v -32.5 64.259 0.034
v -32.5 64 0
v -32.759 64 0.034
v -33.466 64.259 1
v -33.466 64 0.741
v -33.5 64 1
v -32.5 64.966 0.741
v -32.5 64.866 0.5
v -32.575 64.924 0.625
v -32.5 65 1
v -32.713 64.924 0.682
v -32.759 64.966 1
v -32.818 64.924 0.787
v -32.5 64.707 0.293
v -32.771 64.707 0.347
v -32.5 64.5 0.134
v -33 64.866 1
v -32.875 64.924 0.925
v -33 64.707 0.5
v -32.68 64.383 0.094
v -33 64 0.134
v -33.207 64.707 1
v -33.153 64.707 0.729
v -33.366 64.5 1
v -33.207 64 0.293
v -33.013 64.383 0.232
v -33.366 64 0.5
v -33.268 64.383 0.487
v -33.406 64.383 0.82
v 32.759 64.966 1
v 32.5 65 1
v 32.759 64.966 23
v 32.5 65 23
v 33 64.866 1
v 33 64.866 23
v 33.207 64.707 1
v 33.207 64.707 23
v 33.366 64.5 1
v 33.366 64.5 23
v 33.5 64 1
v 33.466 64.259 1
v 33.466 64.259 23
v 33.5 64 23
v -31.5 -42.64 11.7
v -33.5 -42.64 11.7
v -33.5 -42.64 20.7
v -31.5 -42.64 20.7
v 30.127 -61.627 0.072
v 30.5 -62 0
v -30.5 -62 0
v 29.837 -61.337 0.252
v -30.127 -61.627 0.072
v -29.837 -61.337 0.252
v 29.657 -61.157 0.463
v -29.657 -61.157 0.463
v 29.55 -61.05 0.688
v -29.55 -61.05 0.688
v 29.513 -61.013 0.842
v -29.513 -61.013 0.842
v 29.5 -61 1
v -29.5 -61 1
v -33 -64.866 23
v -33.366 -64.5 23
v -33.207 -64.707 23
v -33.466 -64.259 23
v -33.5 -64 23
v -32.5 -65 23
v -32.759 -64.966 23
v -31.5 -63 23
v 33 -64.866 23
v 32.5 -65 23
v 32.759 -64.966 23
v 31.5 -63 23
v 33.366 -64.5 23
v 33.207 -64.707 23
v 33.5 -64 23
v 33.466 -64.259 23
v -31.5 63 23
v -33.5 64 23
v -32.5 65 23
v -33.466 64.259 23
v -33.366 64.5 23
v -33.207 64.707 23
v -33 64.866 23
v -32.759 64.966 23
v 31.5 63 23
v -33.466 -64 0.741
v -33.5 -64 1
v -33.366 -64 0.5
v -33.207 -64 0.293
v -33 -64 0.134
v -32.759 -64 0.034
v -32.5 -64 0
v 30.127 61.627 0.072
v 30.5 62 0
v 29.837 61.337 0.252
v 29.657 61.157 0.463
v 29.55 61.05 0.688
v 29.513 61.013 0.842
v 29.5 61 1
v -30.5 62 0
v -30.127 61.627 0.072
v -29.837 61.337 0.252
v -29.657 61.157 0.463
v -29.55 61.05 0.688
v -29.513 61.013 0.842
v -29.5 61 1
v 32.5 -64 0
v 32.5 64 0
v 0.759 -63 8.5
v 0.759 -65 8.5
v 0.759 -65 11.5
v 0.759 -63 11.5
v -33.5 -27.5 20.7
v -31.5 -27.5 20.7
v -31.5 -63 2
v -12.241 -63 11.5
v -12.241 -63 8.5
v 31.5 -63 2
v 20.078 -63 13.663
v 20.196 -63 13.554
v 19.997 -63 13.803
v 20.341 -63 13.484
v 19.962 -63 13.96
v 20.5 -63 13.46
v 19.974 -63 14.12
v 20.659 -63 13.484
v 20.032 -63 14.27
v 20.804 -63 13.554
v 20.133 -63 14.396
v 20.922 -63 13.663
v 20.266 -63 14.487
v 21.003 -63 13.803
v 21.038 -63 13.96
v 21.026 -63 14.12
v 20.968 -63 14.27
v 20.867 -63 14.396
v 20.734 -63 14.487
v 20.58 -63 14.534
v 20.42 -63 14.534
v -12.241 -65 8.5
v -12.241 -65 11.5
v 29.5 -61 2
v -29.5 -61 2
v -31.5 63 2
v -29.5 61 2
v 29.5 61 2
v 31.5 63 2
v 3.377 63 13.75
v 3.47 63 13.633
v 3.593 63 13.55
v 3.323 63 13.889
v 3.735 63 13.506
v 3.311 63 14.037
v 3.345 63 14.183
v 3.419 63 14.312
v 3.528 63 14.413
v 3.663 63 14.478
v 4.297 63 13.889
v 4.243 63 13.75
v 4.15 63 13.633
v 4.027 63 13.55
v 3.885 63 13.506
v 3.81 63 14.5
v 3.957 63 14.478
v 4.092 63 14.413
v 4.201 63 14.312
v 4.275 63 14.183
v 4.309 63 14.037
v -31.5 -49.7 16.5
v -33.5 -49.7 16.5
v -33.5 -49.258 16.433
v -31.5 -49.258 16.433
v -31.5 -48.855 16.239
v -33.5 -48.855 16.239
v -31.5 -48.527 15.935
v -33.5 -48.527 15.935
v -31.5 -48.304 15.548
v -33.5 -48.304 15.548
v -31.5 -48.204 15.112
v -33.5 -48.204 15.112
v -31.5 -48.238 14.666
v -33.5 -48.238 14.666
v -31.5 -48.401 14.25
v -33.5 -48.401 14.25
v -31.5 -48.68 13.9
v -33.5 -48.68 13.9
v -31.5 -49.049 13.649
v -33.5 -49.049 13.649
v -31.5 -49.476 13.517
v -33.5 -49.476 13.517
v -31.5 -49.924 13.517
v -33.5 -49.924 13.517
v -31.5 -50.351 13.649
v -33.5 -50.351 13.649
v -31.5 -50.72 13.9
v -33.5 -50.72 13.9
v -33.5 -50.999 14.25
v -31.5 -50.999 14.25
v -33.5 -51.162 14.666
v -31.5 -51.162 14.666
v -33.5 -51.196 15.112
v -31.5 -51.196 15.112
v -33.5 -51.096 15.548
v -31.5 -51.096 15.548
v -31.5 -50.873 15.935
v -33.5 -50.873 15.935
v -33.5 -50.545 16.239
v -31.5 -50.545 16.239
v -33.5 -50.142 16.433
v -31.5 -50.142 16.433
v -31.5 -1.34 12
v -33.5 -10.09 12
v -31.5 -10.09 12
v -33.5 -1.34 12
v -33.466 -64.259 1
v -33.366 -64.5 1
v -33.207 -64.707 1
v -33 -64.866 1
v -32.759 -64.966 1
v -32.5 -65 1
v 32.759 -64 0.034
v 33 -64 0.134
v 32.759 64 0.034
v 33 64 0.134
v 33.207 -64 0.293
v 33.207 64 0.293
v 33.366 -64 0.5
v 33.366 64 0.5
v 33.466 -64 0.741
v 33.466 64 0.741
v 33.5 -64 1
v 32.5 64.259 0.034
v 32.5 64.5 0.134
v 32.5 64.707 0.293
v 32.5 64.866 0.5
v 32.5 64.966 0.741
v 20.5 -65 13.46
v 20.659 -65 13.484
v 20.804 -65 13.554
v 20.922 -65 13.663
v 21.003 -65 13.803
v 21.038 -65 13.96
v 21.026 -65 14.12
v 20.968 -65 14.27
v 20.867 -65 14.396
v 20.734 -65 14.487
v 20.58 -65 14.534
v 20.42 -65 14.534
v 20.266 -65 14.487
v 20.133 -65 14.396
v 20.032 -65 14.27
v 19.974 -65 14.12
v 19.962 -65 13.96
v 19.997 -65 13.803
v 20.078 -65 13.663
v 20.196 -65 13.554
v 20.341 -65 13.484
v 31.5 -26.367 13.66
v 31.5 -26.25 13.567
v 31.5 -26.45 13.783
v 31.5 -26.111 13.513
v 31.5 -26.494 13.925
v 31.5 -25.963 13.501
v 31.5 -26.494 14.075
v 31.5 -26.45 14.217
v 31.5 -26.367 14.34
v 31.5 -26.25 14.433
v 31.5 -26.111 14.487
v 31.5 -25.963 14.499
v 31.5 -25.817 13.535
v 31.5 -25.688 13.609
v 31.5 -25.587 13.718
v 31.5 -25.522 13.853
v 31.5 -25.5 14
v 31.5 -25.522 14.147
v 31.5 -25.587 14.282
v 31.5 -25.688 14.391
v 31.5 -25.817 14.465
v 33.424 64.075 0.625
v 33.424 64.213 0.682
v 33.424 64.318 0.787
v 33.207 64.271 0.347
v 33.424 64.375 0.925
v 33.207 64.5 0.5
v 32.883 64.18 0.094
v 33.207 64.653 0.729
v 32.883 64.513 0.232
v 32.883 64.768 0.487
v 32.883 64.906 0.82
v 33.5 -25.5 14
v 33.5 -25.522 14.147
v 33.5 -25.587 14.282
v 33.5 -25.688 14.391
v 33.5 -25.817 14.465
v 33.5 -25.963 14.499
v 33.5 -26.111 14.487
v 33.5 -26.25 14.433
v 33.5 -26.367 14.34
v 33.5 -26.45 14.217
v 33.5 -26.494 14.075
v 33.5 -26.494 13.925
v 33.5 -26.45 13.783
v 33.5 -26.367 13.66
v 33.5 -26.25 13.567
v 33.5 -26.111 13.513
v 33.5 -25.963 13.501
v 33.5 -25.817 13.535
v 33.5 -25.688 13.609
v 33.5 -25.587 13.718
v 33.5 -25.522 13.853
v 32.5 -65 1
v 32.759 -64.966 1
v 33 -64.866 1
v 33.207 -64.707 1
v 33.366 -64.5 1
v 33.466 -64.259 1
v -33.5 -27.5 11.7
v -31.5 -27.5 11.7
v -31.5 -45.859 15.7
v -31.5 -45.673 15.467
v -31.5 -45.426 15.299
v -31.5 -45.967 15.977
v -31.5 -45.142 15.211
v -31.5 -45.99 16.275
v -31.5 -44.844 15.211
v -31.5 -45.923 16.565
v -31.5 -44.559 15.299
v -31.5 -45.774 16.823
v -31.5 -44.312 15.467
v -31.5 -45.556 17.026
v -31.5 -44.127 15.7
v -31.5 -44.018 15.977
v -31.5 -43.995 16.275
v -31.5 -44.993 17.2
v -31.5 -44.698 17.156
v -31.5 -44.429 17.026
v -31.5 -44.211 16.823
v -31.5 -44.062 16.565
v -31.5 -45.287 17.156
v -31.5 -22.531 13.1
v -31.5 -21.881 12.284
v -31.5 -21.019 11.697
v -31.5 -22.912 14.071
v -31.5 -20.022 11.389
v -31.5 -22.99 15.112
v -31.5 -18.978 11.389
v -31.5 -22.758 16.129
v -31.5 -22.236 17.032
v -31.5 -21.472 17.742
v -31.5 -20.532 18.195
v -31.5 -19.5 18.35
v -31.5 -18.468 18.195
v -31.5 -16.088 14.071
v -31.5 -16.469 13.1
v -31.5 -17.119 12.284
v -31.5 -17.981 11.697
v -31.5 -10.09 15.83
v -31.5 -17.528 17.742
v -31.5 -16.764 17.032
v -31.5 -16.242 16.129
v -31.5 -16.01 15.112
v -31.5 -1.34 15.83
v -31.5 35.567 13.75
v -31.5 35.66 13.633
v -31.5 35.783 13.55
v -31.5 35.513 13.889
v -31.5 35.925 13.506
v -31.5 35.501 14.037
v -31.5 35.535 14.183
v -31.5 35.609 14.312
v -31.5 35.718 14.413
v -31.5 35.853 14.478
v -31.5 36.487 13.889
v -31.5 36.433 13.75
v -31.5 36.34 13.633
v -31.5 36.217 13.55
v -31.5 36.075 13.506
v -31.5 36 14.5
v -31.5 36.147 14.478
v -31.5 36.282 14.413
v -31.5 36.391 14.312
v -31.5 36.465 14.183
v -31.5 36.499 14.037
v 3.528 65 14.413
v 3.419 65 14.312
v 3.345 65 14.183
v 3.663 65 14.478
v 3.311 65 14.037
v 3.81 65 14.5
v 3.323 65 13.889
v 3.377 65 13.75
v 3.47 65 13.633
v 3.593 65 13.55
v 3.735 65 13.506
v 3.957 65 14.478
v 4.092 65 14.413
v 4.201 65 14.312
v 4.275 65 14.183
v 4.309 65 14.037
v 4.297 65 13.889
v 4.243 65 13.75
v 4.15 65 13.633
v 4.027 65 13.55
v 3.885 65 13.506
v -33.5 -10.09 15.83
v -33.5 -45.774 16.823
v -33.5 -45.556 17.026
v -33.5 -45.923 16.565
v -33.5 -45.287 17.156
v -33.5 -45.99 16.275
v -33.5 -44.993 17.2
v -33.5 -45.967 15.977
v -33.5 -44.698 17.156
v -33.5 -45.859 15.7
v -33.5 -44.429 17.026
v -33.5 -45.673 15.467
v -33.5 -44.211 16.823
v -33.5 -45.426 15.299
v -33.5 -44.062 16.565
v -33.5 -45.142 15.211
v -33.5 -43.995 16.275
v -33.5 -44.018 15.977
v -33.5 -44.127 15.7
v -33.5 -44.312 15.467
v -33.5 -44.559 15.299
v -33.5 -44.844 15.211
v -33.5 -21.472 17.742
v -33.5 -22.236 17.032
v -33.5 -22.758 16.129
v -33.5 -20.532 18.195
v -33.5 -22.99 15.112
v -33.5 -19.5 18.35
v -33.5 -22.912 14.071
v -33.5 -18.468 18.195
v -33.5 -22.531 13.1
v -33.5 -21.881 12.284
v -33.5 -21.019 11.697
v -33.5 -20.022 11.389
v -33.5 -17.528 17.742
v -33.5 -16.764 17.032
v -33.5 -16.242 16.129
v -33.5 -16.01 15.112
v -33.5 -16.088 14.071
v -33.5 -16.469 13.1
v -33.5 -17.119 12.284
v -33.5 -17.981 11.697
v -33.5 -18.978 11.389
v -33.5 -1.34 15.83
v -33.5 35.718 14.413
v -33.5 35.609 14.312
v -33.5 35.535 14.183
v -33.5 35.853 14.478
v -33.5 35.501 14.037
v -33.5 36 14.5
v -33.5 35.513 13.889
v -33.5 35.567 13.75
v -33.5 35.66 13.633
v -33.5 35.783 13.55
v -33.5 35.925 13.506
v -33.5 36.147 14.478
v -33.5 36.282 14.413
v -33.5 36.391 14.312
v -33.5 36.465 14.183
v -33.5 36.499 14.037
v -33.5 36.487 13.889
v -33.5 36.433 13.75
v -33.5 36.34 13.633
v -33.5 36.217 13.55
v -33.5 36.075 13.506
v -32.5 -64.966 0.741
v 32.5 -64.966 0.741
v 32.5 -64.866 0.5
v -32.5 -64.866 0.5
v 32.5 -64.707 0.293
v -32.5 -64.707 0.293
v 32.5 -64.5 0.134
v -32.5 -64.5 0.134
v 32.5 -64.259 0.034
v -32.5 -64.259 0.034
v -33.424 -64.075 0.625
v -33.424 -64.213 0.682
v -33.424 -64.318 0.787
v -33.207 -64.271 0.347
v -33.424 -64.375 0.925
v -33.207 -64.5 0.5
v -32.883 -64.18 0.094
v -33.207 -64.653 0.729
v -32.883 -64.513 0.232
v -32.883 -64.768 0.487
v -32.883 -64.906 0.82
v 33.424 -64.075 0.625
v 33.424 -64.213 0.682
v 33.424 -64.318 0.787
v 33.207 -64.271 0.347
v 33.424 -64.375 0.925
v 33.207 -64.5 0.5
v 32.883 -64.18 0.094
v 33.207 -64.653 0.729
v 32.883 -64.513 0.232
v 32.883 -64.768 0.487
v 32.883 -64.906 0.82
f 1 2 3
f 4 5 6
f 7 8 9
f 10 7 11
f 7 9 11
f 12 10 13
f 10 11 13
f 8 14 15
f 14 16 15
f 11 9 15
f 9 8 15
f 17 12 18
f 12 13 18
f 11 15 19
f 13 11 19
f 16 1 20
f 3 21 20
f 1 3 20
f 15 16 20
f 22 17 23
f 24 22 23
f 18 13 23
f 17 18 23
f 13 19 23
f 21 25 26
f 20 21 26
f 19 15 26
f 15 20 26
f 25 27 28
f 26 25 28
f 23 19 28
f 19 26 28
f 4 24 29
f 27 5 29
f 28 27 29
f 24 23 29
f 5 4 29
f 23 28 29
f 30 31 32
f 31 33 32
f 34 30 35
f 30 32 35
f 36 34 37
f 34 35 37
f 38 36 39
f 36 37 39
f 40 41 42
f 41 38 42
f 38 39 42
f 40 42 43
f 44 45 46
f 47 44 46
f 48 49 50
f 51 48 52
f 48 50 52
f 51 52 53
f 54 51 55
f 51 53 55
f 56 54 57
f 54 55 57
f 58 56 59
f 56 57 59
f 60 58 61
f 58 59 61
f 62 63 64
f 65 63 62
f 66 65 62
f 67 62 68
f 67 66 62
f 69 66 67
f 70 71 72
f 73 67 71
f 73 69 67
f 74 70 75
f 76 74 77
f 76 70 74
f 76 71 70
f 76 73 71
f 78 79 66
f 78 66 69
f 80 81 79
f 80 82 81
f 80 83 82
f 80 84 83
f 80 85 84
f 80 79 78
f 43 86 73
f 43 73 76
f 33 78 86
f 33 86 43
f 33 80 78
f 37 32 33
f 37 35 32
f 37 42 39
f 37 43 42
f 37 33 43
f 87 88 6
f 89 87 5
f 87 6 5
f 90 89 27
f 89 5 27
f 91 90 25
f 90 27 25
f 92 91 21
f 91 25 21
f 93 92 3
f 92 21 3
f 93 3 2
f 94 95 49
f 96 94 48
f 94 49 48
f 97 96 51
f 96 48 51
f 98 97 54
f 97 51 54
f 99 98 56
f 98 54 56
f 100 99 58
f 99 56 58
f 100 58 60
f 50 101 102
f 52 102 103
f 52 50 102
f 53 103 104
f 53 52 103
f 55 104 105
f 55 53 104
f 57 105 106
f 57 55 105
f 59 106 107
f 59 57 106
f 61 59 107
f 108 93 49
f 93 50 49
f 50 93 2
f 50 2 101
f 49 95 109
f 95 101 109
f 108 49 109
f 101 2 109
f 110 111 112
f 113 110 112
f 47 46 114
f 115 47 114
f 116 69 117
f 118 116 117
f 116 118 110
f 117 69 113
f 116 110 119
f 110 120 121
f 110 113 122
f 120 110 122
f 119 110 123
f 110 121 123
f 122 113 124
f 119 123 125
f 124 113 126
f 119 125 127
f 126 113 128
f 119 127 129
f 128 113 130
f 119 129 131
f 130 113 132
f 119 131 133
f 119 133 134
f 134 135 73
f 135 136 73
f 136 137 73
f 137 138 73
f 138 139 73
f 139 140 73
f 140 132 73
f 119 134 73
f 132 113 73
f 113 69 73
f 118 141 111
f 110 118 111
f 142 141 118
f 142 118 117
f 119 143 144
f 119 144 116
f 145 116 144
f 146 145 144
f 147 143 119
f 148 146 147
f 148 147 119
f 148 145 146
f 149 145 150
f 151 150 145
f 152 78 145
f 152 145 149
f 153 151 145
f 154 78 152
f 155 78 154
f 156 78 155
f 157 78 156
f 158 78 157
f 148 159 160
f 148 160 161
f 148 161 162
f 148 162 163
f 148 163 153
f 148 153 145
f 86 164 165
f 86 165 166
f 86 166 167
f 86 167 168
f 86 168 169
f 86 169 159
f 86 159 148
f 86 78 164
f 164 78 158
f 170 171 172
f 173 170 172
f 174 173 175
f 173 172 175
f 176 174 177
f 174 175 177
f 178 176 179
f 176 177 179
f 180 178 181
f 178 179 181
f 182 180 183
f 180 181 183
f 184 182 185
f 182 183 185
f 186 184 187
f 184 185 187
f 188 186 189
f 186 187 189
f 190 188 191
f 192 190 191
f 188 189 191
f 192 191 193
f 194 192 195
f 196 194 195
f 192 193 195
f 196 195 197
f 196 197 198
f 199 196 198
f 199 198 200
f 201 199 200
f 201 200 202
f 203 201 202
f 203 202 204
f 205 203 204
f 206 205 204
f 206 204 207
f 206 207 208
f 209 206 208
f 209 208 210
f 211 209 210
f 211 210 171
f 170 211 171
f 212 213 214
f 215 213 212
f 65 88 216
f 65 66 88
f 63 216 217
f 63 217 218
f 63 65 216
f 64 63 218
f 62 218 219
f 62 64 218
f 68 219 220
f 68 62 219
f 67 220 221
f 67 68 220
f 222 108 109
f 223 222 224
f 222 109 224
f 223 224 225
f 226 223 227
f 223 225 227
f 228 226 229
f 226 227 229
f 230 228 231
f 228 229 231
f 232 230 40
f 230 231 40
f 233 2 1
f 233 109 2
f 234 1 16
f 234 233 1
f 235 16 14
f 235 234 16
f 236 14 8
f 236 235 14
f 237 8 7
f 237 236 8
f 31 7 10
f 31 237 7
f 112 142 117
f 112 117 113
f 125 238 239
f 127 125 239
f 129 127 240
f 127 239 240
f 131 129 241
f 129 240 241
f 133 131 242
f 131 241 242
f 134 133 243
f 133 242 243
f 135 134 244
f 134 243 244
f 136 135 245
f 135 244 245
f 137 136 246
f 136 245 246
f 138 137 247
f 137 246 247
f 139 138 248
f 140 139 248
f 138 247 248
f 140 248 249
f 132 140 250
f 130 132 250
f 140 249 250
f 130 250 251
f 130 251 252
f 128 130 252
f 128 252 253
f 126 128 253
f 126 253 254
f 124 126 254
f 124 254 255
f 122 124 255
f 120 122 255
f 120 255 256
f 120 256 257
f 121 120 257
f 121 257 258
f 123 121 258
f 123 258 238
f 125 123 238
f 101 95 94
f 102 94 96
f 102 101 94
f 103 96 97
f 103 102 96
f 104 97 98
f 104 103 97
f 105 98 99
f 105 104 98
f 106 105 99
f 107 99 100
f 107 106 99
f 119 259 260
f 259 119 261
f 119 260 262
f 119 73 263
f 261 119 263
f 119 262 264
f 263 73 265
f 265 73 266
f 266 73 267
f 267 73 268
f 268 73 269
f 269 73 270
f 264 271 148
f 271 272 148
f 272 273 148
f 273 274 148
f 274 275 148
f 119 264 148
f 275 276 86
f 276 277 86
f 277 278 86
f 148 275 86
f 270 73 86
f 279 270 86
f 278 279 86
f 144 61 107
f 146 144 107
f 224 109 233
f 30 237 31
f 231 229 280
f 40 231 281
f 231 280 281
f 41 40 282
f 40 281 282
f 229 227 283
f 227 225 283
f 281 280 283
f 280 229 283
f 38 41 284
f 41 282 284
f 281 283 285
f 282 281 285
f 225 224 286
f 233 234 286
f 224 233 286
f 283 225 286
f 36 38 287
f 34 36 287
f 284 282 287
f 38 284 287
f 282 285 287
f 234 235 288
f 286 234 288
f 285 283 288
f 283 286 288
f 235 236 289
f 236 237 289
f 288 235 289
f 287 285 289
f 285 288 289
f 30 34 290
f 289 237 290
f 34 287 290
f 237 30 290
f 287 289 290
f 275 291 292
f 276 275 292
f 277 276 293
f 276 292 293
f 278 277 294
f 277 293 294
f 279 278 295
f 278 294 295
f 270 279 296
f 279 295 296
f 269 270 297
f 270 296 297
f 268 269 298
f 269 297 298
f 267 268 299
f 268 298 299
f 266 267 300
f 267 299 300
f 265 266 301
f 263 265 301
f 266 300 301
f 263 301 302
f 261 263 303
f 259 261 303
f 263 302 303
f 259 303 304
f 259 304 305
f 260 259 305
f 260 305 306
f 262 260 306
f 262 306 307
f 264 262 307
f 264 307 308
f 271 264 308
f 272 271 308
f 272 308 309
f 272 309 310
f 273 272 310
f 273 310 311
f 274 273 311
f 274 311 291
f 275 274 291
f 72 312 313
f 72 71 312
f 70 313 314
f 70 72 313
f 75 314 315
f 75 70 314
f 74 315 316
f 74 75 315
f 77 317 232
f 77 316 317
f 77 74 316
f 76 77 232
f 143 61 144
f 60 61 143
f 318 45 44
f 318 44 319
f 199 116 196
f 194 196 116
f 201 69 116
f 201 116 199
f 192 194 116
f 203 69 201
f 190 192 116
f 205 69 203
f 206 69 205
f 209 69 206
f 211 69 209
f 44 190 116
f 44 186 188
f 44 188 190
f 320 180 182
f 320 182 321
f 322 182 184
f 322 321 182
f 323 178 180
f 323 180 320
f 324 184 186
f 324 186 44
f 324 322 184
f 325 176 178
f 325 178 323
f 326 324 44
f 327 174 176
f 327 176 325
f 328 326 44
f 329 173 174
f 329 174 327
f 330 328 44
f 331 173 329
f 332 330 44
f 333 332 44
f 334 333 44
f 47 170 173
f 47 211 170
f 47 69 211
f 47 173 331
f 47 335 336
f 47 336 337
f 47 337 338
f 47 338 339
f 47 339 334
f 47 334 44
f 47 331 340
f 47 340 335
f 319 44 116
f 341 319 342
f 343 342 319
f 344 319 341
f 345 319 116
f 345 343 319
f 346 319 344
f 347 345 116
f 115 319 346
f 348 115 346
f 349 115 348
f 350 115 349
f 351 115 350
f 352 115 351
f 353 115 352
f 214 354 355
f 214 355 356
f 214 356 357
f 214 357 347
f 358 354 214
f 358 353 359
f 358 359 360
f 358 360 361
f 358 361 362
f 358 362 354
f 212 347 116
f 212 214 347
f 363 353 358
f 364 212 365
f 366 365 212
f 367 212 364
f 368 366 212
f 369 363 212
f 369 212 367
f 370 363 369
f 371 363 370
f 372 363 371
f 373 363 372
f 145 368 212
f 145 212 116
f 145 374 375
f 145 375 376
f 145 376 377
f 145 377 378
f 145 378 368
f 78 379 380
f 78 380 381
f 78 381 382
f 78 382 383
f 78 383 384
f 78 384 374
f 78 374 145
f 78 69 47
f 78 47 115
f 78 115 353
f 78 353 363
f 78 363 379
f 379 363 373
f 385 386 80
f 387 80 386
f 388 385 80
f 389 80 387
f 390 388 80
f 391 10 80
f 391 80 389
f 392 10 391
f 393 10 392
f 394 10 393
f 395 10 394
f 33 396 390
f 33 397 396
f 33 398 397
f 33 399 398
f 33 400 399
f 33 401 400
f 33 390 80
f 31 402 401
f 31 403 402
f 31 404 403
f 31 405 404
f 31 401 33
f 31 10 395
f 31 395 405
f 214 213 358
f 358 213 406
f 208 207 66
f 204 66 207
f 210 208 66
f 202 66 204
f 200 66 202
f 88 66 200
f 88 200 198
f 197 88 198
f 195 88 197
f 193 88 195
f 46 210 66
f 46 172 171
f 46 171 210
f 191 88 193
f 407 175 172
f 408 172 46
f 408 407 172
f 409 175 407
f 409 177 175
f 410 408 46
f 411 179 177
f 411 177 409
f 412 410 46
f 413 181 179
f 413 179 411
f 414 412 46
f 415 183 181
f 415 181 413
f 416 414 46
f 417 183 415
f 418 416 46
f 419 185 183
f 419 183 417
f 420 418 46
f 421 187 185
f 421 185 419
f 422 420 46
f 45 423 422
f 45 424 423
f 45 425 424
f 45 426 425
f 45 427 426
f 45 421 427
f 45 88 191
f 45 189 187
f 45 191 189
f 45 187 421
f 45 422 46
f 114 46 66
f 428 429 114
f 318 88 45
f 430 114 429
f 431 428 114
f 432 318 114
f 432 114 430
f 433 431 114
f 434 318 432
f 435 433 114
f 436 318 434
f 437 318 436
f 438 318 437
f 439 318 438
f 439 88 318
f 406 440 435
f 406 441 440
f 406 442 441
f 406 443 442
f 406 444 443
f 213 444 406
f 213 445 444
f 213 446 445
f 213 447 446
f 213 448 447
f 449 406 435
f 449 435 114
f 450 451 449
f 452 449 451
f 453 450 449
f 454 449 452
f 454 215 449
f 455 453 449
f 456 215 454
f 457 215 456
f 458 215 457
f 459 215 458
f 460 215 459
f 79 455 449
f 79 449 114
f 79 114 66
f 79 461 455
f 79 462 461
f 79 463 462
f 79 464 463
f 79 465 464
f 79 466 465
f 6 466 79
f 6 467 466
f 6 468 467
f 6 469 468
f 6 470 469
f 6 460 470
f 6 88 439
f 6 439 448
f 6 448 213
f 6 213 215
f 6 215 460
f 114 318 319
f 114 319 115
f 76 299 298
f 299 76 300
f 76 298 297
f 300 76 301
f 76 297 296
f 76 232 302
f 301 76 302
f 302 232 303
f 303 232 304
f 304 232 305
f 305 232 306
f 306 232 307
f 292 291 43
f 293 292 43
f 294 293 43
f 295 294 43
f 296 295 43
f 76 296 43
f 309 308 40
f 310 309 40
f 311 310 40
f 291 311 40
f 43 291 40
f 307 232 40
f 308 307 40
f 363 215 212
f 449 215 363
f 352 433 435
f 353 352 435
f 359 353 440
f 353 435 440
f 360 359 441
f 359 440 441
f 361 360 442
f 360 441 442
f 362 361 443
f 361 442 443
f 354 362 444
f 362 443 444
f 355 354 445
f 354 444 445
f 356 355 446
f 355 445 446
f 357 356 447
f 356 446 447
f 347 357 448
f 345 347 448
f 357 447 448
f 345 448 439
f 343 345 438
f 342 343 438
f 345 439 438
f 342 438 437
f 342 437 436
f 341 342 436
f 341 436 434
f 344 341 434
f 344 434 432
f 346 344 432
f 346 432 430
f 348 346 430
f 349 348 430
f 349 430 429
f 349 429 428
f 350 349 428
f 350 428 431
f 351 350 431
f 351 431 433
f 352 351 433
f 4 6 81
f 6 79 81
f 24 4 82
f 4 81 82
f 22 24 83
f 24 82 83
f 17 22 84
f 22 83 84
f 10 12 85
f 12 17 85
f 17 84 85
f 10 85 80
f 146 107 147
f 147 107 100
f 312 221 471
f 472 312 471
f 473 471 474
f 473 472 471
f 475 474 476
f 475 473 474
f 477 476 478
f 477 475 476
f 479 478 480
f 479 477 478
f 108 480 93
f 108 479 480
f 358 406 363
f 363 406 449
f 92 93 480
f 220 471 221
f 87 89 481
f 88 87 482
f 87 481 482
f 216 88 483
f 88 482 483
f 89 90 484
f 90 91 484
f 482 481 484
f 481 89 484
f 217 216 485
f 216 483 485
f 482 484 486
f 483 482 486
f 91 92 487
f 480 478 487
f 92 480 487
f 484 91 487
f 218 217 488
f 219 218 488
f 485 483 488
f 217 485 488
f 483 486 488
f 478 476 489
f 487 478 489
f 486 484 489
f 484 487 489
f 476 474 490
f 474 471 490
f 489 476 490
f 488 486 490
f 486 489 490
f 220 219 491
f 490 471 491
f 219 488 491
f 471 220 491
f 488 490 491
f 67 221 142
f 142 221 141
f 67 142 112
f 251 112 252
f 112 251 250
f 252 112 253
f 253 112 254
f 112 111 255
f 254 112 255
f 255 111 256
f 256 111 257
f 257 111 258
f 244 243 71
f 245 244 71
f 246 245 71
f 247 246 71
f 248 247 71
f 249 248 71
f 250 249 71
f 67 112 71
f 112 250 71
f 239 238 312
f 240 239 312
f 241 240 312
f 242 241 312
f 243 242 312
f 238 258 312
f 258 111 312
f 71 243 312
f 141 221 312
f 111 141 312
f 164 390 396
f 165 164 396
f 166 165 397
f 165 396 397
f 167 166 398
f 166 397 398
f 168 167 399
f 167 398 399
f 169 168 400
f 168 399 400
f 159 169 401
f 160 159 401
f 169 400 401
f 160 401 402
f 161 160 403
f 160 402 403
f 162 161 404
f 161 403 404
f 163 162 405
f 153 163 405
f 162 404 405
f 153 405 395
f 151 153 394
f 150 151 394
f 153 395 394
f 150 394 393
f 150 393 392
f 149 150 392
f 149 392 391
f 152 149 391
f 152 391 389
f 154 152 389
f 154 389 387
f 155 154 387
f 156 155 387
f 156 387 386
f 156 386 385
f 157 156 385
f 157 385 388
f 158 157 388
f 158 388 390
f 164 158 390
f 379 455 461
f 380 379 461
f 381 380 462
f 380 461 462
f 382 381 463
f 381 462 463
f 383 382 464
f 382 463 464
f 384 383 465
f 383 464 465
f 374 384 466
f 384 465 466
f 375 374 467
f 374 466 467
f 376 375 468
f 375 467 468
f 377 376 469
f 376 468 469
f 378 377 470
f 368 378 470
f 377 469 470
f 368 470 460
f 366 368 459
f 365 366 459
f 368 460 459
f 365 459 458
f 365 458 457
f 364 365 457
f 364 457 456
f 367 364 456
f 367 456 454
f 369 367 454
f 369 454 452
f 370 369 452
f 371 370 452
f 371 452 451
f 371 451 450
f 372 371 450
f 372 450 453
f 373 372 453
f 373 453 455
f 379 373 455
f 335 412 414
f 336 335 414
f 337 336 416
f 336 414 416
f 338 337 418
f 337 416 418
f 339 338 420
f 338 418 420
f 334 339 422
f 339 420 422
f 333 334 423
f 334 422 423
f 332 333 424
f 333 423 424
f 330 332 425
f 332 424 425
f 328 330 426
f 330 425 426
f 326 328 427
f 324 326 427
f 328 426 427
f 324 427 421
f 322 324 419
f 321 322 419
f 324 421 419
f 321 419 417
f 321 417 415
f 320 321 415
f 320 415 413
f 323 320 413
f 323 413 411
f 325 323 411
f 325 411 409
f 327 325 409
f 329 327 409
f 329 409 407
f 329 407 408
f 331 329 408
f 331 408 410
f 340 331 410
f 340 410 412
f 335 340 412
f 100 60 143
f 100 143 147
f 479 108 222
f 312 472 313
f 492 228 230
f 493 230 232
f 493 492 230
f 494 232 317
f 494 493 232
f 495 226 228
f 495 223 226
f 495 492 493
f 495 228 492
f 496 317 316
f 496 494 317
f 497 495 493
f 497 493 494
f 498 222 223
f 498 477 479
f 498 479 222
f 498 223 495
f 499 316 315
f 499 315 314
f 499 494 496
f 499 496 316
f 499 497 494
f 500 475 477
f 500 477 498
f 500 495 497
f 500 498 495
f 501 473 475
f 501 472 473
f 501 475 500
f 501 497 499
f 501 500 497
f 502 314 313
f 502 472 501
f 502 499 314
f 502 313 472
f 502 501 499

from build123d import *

# Parameters (mm, degrees)
SCHIZZO1_W                    = 67
SCHIZZO1_H                    = 130
ESTRUSIONE_ESTRUSIONE1_DEPTH  = 23
SCHIZZO2_W                    = 63
SCHIZZO2_H                    = 126
TAGLIO_ESTRUSIONE1_DEPTH      = 21
TAGLIO_ESTRUSIONE2_DEPTH      = 77.08054942
TAGLIO_ESTRUSIONE2_DEPTH_BACK = 77.08054942
SCHIZZO3_W                    = 59
SCHIZZO3_H                    = 122
TAGLIO_ESTRUSIONE4_REACH      = 98.141
SCHIZZO4_R                    = 1.5
SCHIZZO4_R_2                  = 3.5
SCHIZZO4_R_3                  = 1
SCHIZZO4_W                    = 9
SCHIZZO4_H                    = 15.14
SCHIZZO4_W_2                  = 3.83
SCHIZZO4_H_2                  = 8.75
TAGLIO_ESTRUSIONE5_REACH      = 138.203
SCHIZZO5_W                    = 13
SCHIZZO5_H                    = 3
RACCORDO1_R                   = 1
TAGLIO_ESTRUSIONE6_REACH      = 98.141
SCHIZZO6_R                    = 0.5
SCHIZZO7_R                    = 0.5
TAGLIO_ESTRUSIONE7_DEPTH      = 10
SCHIZZO8_R                    = 0.5
TAGLIO_ESTRUSIONE8_DEPTH      = 10
SCHIZZO9_R                    = 0.54
TAGLIO_ESTRUSIONE9_DEPTH      = 10


with BuildPart() as part:
    # Schizzo1 → Estrusione-Estrusione1 (new body)
    with BuildSketch(Plane.XY):
        Rectangle(SCHIZZO1_W, SCHIZZO1_H)
    extrude(amount=ESTRUSIONE_ESTRUSIONE1_DEPTH)

    # Schizzo2 → Taglio-Estrusione1 (cut)
    with BuildSketch(Plane.XY.offset(23)):
        Rectangle(SCHIZZO2_W, SCHIZZO2_H)
    extrude(amount=-TAGLIO_ESTRUSIONE1_DEPTH, mode=Mode.SUBTRACT)

    # Schizzo3 → Taglio-Estrusione2 (cut, two sides: drawn at the far end of the back side and taken through both)
    with BuildSketch(Plane.XY.offset(2).offset(-TAGLIO_ESTRUSIONE2_DEPTH_BACK)):
        Rectangle(SCHIZZO3_W, SCHIZZO3_H)
    extrude(amount=TAGLIO_ESTRUSIONE2_DEPTH + TAGLIO_ESTRUSIONE2_DEPTH_BACK, mode=Mode.SUBTRACT)

    # Schizzo4 → Taglio-Estrusione4 (cut, up to next)
    with BuildSketch(Plane.ZY.offset(33.5), mode=Mode.PRIVATE) as taglio_estrusione4_sk1:
        with Locations((15, -49.7)):
            Circle(SCHIZZO4_R)
    taglio_estrusione4_tool1 = extrude(taglio_estrusione4_sk1.sketch, amount=-TAGLIO_ESTRUSIONE4_REACH, mode=Mode.PRIVATE) & part.part
    # Schizzo4 → Taglio-Estrusione4 (cut, up to next)
    with BuildSketch(Plane.ZY.offset(33.5), mode=Mode.PRIVATE) as taglio_estrusione4_sk2:
        with Locations((14.85, -19.5)):
            Circle(SCHIZZO4_R_2)
    taglio_estrusione4_tool2 = extrude(taglio_estrusione4_sk2.sketch, amount=-TAGLIO_ESTRUSIONE4_REACH, mode=Mode.PRIVATE) & part.part
    # Schizzo4 → Taglio-Estrusione4 (cut, up to next)
    with BuildSketch(Plane.ZY.offset(33.5), mode=Mode.PRIVATE) as taglio_estrusione4_sk3:
        with Locations((16.2, -44.99254441)):
            Circle(SCHIZZO4_R_3)
    taglio_estrusione4_tool3 = extrude(taglio_estrusione4_sk3.sketch, amount=-TAGLIO_ESTRUSIONE4_REACH, mode=Mode.PRIVATE) & part.part
    # Schizzo4 → Taglio-Estrusione4 (cut, up to next)
    with BuildSketch(Plane.ZY.offset(33.5), mode=Mode.PRIVATE) as taglio_estrusione4_sk4:
        with Locations((16.2, -35.07)):
            Rectangle(SCHIZZO4_W, SCHIZZO4_H)
    taglio_estrusione4_tool4 = extrude(taglio_estrusione4_sk4.sketch, amount=-TAGLIO_ESTRUSIONE4_REACH, mode=Mode.PRIVATE) & part.part
    # Schizzo4 → Taglio-Estrusione4 (cut, up to next)
    with BuildSketch(Plane.ZY.offset(33.5), mode=Mode.PRIVATE) as taglio_estrusione4_sk5:
        with Locations((13.915, -5.715)):
            Rectangle(SCHIZZO4_W_2, SCHIZZO4_H_2)
    taglio_estrusione4_tool5 = extrude(taglio_estrusione4_sk5.sketch, amount=-TAGLIO_ESTRUSIONE4_REACH, mode=Mode.PRIVATE) & part.part
    add(taglio_estrusione4_tool1.solids().sort_by_distance((-33.5, -49.7, 15))[0], mode=Mode.SUBTRACT)
    add(taglio_estrusione4_tool2.solids().sort_by_distance((-33.5, -19.5, 14.85))[0], mode=Mode.SUBTRACT)
    add(taglio_estrusione4_tool3.solids().sort_by_distance((-33.5, -44.992544, 16.2))[0], mode=Mode.SUBTRACT)
    add(taglio_estrusione4_tool4.solids().sort_by_distance((-33.5, -35.07, 16.2))[0], mode=Mode.SUBTRACT)
    add(taglio_estrusione4_tool5.solids().sort_by_distance((-33.5, -5.715, 13.915))[0], mode=Mode.SUBTRACT)

    # Schizzo5 → Taglio-Estrusione5 (cut, up to next)
    with BuildSketch(Plane.XZ.offset(65), mode=Mode.PRIVATE) as taglio_estrusione5_sk1:
        with Locations((-5.741459814, 10)):
            Rectangle(SCHIZZO5_W, SCHIZZO5_H)
    taglio_estrusione5_tool1 = extrude(taglio_estrusione5_sk1.sketch, amount=-TAGLIO_ESTRUSIONE5_REACH, mode=Mode.PRIVATE) & part.part
    add(taglio_estrusione5_tool1.solids().sort_by_distance((-5.74146, -65, 10))[0], mode=Mode.SUBTRACT)

    # Raccordo1
    raccordo1_edges = [part.edges().sort_by_distance(p)[0] for p in [
        (29.5, 0, 0),
        (0, -61, 0),
        (-29.5, 0, 0),
        (0, 61, 0),
        (0, -65, 0),
        (-33.5, 0, 0),
        (0, 65, 0),
        (33.5, 0, 0),
        (33.5, -65, 11.5),
        (-33.5, -65, 11.5),
        (-33.5, 65, 11.5),
        (33.5, 65, 11.5),
    ]]
    fillet(raccordo1_edges, radius=RACCORDO1_R)

    # Schizzo6 → Taglio-Estrusione6 (cut, up to next)
    with BuildSketch(Plane(origin=(33.5, 0, 0), x_dir=(0, 0, -1), z_dir=(1, 0, 0)), mode=Mode.PRIVATE) as taglio_estrusione6_sk1:
        with Locations(Location((-14, -26, 0), (0, 0, 90))):
            Circle(SCHIZZO6_R)
    taglio_estrusione6_tool1 = extrude(taglio_estrusione6_sk1.sketch, amount=-TAGLIO_ESTRUSIONE6_REACH, mode=Mode.PRIVATE) & part.part
    add(taglio_estrusione6_tool1.solids().sort_by_distance((33.5, -26, 14))[0], mode=Mode.SUBTRACT)

    # Schizzo7 → Taglio-Estrusione7 (cut)
    with BuildSketch(Plane(origin=(0, 65, 0), x_dir=(1, 0, 0), z_dir=(0, 1, 0))):
        with Locations(Location((3.81, -14, 0), (0, 0, 270))):
            Circle(SCHIZZO7_R)
    extrude(amount=-TAGLIO_ESTRUSIONE7_DEPTH, mode=Mode.SUBTRACT)

    # Schizzo8 → Taglio-Estrusione8 (cut)
    with BuildSketch(Plane.ZY.offset(33.5)):
        with Locations((14, 36)):
            Circle(SCHIZZO8_R)
    extrude(amount=-TAGLIO_ESTRUSIONE8_DEPTH, mode=Mode.SUBTRACT)

    # Schizzo9 → Taglio-Estrusione9 (cut)
    with BuildSketch(Plane.XZ.offset(65)):
        with Locations(Location((20.5, 14, 0), (0, 0, 270))):
            Circle(SCHIZZO9_R)
    extrude(amount=-TAGLIO_ESTRUSIONE9_DEPTH, mode=Mode.SUBTRACT)


solid = part.part
